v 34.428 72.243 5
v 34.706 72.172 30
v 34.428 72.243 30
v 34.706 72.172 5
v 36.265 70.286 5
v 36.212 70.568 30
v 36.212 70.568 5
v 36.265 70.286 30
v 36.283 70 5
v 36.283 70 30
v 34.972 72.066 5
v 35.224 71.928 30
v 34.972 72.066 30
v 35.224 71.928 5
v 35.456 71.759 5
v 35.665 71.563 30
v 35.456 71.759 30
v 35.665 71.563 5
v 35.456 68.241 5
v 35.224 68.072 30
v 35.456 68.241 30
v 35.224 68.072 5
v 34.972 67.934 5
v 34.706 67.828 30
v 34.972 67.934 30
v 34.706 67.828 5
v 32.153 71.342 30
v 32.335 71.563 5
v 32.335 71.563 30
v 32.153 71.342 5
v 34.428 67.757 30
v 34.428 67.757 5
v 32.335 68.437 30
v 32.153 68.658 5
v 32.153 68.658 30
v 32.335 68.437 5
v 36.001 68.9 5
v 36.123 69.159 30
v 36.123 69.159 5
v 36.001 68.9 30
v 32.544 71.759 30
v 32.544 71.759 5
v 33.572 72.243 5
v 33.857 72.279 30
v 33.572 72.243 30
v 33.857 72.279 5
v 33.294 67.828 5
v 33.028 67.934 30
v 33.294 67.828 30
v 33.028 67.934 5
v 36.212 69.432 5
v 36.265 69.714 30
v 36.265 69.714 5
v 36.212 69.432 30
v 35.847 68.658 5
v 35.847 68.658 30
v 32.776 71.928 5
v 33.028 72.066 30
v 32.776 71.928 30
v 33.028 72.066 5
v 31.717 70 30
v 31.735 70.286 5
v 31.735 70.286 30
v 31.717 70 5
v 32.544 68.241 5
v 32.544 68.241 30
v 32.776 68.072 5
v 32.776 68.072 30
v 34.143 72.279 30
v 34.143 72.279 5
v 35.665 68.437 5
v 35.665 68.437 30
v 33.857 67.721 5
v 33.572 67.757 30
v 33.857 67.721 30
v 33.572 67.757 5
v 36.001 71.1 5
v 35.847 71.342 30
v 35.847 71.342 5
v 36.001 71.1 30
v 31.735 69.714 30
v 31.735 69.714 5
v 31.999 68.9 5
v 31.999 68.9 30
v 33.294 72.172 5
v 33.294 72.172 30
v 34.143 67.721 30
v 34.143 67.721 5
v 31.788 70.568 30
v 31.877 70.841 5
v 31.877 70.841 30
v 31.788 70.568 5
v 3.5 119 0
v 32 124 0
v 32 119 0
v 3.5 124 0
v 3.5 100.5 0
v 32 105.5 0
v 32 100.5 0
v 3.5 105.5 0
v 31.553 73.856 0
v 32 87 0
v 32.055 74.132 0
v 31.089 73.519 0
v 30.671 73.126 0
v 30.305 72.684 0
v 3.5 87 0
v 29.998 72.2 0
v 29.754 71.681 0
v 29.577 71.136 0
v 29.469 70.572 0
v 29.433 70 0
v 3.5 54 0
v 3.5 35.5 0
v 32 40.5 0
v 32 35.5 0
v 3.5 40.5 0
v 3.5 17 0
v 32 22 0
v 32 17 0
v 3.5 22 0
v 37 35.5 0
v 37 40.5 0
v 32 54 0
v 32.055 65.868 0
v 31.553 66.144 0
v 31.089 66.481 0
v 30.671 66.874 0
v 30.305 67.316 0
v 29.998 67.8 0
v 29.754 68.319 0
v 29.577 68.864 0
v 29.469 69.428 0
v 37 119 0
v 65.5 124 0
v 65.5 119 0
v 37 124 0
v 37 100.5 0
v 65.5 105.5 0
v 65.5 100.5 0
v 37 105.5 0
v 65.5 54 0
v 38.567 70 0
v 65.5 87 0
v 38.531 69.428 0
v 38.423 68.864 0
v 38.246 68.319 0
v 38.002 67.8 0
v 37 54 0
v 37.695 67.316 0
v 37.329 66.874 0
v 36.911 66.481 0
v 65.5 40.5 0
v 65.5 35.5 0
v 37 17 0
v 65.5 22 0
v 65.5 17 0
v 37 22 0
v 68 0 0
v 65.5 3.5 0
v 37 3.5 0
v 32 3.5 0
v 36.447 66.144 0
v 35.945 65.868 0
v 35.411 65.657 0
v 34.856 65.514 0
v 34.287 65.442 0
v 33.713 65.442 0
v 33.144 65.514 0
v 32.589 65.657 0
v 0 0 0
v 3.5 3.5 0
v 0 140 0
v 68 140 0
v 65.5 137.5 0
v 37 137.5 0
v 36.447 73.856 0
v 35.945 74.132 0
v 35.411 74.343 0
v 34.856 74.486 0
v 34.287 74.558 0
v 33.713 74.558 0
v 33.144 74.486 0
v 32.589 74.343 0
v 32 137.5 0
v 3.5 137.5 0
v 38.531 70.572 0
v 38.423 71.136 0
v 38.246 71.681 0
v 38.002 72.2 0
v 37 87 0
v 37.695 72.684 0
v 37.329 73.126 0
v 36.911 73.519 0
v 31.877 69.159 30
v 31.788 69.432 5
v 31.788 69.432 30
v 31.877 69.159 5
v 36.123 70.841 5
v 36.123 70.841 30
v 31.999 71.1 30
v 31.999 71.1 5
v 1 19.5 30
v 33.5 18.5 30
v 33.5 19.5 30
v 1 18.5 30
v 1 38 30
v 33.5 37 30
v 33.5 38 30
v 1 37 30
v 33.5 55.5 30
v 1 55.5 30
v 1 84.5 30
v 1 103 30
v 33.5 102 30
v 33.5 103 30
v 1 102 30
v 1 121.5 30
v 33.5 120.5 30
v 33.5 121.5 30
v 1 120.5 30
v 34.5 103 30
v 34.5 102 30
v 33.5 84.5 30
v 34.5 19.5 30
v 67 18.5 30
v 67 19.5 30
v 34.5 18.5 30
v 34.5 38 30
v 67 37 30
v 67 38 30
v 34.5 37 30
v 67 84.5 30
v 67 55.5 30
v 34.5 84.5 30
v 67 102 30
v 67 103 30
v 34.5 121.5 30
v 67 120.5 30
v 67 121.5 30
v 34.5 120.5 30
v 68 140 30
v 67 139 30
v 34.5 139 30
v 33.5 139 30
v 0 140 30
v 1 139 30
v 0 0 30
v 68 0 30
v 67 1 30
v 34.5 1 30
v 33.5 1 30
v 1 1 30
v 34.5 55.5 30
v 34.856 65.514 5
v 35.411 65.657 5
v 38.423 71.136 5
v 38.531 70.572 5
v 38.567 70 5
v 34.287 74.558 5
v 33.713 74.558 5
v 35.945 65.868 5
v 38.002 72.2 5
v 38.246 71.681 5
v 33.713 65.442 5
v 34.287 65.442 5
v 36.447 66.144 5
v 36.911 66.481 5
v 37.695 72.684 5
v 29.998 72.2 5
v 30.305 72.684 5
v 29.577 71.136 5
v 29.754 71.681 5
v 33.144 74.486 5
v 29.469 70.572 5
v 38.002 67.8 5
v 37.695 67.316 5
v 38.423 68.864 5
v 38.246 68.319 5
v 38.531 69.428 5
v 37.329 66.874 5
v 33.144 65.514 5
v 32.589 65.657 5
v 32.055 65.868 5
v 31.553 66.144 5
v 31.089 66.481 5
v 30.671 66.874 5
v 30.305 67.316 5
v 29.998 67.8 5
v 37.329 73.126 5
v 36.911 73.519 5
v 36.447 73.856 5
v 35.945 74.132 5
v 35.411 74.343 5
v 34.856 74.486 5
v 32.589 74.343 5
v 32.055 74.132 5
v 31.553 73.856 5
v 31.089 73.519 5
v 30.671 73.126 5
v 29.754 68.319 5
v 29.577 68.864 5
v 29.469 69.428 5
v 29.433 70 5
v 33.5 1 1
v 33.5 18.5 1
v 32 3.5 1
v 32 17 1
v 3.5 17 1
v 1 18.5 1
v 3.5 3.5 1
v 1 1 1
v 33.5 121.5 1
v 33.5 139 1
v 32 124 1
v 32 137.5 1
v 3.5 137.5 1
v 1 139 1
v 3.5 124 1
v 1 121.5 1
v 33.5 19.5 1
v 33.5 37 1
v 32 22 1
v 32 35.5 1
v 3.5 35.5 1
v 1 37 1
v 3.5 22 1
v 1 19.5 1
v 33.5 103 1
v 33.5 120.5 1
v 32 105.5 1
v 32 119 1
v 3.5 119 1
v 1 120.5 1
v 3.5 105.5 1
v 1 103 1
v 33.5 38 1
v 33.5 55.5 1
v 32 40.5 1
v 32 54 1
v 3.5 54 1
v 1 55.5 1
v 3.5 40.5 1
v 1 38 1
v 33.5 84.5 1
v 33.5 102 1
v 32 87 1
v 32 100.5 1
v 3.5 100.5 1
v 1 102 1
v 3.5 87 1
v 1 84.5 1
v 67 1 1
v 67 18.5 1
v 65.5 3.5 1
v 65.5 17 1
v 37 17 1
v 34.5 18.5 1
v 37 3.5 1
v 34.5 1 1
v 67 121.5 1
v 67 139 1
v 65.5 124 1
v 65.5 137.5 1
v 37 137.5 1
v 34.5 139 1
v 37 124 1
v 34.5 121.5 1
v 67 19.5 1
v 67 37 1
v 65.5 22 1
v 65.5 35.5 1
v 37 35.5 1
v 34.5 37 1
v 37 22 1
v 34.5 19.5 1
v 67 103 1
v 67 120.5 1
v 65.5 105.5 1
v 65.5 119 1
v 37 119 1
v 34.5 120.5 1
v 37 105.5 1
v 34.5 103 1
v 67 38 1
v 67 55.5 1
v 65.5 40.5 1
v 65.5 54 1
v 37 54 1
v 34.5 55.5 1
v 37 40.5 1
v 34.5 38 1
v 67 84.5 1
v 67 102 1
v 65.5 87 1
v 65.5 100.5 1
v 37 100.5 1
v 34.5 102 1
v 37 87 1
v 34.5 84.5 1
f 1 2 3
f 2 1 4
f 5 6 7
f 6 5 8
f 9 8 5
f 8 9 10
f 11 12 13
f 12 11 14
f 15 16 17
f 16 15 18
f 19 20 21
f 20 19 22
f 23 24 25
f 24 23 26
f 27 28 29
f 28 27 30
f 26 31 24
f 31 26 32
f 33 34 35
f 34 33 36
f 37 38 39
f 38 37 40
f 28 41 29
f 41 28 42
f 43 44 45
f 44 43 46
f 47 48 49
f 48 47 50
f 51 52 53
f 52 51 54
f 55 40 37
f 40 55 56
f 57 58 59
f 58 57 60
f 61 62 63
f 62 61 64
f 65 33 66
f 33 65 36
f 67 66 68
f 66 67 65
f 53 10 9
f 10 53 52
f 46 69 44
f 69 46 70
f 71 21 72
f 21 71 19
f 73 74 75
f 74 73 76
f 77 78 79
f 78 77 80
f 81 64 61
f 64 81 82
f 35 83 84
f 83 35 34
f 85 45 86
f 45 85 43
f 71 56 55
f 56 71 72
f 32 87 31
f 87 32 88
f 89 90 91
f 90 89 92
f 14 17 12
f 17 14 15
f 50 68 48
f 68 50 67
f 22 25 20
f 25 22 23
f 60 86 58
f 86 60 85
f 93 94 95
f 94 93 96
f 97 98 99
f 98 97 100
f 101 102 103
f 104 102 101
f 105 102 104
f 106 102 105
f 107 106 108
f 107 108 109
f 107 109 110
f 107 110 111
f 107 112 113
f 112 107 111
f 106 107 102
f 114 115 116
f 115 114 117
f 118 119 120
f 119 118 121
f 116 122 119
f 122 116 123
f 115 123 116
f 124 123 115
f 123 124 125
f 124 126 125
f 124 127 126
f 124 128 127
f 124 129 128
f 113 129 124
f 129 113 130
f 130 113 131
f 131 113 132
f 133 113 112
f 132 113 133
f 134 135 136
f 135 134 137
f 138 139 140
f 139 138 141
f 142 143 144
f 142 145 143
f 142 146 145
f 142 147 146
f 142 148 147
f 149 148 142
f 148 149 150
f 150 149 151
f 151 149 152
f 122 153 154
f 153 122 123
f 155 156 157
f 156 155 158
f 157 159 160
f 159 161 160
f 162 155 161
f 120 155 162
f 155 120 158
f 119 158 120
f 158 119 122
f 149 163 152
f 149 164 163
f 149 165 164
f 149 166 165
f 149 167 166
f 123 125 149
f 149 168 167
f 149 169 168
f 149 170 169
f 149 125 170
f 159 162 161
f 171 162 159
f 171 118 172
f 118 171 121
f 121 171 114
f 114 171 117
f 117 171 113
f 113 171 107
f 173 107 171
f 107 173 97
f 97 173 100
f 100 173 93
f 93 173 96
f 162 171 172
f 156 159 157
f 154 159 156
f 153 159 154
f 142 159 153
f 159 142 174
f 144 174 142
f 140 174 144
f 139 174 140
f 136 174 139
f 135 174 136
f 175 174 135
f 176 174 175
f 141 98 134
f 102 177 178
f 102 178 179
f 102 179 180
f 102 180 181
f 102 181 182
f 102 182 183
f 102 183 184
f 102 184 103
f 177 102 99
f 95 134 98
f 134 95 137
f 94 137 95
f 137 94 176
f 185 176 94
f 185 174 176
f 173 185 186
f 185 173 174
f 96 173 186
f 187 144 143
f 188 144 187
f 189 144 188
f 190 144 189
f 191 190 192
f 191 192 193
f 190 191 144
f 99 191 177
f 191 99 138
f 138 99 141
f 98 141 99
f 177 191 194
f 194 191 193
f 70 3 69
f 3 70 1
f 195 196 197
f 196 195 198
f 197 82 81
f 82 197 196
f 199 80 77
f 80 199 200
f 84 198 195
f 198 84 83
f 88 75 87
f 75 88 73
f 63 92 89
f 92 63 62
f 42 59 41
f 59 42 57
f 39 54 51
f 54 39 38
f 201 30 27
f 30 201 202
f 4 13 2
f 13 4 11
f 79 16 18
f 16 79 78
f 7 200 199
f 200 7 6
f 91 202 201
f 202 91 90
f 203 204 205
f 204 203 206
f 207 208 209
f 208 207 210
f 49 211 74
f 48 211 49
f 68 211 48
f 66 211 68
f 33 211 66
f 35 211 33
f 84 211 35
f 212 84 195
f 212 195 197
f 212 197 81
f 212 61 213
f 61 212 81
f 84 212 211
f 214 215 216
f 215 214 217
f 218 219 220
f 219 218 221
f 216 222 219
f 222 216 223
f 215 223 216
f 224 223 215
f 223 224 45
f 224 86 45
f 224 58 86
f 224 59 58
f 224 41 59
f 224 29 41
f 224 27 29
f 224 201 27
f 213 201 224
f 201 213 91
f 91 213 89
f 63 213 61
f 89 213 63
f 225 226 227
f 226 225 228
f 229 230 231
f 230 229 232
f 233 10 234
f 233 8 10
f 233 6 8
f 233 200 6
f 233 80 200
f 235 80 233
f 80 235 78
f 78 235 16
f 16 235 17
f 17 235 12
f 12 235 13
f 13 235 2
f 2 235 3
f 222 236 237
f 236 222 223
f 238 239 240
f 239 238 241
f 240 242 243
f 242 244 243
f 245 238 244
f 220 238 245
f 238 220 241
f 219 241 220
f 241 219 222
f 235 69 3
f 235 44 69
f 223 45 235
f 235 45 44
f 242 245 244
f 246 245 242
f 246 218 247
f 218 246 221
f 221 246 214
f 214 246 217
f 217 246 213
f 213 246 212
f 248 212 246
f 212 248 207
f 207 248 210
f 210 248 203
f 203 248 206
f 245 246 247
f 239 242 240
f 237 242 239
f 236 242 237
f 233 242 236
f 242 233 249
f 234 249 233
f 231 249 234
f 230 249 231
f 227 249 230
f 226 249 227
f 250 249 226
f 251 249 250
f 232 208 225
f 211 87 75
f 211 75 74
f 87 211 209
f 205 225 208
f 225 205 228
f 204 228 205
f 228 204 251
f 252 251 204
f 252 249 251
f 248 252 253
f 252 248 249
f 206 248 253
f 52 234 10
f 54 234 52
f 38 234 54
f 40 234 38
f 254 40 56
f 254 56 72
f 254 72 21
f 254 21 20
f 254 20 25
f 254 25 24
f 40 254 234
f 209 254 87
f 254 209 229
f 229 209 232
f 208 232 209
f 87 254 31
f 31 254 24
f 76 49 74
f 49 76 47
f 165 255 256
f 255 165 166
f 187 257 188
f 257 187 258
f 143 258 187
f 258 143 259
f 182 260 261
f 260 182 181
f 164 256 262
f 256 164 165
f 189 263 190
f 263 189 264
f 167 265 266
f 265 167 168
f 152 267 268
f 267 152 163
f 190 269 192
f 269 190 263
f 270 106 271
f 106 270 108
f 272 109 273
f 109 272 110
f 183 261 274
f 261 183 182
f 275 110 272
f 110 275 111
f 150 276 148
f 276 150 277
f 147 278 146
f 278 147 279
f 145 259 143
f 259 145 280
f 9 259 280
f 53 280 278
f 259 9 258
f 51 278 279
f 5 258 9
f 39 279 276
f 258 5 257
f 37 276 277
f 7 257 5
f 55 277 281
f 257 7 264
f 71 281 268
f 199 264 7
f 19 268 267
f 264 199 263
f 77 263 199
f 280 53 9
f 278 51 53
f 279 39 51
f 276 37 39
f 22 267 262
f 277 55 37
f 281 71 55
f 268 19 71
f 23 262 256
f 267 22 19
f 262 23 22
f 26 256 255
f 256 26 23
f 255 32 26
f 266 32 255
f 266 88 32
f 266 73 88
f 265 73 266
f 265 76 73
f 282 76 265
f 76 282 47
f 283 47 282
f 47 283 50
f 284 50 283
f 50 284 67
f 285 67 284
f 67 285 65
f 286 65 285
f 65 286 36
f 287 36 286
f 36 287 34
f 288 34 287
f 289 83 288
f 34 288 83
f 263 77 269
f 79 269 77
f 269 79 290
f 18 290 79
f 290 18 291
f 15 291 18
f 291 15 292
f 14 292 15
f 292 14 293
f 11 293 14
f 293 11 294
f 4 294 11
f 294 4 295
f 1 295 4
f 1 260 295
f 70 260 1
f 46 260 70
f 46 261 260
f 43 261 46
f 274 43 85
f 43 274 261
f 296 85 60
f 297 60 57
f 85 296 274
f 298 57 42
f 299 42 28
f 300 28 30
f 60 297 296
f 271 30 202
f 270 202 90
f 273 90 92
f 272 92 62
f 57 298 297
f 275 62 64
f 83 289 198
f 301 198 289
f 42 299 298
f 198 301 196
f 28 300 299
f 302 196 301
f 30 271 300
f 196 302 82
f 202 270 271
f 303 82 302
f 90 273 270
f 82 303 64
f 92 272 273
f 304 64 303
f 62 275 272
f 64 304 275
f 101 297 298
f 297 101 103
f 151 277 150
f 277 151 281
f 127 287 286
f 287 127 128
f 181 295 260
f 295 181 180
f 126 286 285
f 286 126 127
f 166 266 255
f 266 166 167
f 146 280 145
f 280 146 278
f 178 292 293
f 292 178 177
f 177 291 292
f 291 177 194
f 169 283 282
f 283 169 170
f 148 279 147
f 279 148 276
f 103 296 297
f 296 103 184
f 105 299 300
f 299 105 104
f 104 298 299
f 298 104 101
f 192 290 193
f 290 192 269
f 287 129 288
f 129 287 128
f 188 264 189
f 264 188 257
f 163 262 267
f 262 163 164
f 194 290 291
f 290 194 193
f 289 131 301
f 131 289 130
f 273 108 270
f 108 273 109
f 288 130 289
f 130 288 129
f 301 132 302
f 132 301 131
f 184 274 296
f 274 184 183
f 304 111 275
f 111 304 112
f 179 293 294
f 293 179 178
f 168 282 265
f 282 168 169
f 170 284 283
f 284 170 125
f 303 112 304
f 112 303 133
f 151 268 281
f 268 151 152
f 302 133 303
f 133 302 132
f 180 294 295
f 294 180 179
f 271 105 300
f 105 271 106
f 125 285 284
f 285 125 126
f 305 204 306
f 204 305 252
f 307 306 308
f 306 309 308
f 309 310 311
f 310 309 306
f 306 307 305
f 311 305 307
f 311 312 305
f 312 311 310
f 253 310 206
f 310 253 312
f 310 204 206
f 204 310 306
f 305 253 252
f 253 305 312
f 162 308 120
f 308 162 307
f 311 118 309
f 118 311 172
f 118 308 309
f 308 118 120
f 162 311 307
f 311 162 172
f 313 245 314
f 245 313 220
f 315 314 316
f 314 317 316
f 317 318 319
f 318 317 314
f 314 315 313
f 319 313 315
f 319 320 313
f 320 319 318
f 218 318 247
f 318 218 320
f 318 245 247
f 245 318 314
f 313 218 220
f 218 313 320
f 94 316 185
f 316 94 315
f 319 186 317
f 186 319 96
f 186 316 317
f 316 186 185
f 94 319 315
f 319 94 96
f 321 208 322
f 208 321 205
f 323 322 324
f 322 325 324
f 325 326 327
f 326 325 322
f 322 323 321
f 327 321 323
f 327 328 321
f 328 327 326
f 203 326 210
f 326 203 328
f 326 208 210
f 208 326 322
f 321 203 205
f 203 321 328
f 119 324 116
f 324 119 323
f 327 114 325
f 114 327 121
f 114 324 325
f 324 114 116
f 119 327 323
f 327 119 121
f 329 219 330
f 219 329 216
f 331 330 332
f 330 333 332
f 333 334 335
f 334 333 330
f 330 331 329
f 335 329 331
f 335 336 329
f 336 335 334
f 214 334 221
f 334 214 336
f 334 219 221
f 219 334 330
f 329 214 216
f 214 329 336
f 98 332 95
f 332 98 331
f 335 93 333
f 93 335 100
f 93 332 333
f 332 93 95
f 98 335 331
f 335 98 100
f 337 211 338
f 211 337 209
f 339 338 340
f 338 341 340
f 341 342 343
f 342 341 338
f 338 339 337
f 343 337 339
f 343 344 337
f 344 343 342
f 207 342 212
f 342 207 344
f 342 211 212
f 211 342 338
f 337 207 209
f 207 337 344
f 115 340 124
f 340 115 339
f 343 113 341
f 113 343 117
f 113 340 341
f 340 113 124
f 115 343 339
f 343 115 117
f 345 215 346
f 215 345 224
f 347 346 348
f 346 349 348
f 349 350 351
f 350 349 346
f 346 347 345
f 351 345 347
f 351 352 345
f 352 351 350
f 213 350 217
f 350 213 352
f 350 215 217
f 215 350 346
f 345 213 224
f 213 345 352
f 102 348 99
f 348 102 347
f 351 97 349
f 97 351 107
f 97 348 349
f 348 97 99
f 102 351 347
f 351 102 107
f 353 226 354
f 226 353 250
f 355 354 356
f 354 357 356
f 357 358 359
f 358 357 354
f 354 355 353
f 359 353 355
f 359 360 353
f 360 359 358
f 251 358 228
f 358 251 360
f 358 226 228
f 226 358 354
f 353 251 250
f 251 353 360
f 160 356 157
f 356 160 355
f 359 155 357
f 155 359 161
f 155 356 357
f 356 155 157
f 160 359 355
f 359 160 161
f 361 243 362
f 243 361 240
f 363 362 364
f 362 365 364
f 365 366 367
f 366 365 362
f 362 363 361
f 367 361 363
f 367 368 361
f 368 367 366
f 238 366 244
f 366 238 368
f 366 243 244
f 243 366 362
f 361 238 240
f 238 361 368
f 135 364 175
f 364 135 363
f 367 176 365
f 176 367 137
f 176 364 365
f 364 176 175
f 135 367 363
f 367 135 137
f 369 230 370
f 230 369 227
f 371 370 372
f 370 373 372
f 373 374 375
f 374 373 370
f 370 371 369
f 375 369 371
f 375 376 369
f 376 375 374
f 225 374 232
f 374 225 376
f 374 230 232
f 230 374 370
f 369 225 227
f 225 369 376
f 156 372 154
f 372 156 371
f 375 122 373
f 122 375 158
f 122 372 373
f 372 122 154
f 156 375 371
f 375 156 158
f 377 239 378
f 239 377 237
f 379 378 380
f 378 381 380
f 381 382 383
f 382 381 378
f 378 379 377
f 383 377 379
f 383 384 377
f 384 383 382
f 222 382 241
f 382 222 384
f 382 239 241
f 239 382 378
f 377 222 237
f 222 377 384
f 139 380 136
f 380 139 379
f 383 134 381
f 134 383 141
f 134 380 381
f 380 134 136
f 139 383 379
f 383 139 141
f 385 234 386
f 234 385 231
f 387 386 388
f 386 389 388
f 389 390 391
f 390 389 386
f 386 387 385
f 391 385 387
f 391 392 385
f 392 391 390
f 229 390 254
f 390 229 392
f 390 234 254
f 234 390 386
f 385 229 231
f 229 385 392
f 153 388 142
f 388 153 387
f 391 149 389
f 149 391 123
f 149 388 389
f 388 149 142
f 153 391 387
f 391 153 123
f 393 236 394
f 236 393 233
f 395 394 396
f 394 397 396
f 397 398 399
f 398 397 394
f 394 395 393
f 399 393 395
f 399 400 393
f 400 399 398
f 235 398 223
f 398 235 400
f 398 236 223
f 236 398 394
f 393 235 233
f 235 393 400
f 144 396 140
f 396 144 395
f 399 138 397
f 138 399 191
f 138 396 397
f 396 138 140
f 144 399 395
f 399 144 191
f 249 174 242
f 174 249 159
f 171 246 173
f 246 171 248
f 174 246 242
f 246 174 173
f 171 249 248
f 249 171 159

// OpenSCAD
// make a box for a 50mm ammo can

$fn=50;
//ammo can inside dimensions.  long side is x axis.
can_x = 281;
can_y = 142;
can_z = 173;
can_gap = 1;    // leave this gap between the box and can walls

wall=1;         // thickness of wall being printed
floor = wall;   // thickness of floor being printed

// internal maximum box
box_max_x = can_x - 2 * can_gap;
box_max_y = can_y - 2 * can_gap;
box_max_z = can_z;

module emboss_text(text="",size=10,height=.5, vbump=0) {
    linear_extrude(height)
        mirror()
            translate([0,vbump,0])
                #text(text,size,valign="bottom",halign="right");
}

module box(txt,n_x,n_y,bat_x,bat_y,box_z,hole_offset,box_x=0,box_y=box_max_y) {
    //  txt -    text to be embossed on bottom.
    //  n_x -    number of batteries in x direction.
    //  n_y -    number of batteries in y direction.
    //  bat_x -  battery dimension in x direction.
    //  bat_y -  battery dimension in y direction.
    //  box_z -  height of box.
    //  hole_offset - if not none, size of hole edges.
    //  box_x -  x dimension of box, defaults to minimal size.
    //  box_y -  y dimension of box, defaults to max y of ammo can.

    box_x = (box_x == 0) ? n_x*bat_x+(n_x+1)*wall : box_x;
    difference() {
        cube([box_x,box_y,box_z]);
        #translate([box_x,box_y,0]) rotate([0,0,180]) translate([1,1,0])
            emboss_text(text=txt,size=5 ,height=.5);
        for (rr=[0:n_x-1]) {
            for (cc=[0:n_y-1]) {
                translate([(wall+bat_x)*rr+wall,(wall+bat_y)*cc+wall,wall]) {
                    cube([bat_x,bat_y,box_z]);
                    translate([hole_offset/2,hole_offset/2,-wall])
                        #cube([bat_x-hole_offset+1,bat_y-hole_offset+1,box_z]);
                }
            }
        }
    }
}

module battery_inset(bat_x, bat_y, box_z, wall, hole_offset) {
    cube([bat_x,bat_y,box_z]);
    translate([hole_offset/2,hole_offset/2,-wall])
        cube([bat_x-hole_offset+1,bat_y-hole_offset+1,box_z]);
}

// .1160/.0254 is for #4-40 bolt
module lift_hole(box_x, box_y, box_z,d1=.1160/.0254,d2=.1160/.0127,h1=5) {
    translate([box_x/2,box_y/2,0]) {
        translate([0,0,box_z/2])
            #cylinder(h=box_z,d=d1,center=true);
        translate([0,0,h1/2])
            #cylinder(h=h1,d=d2,center=true);
    }
}

module cbox(txt,n_x,n_y,bat_x,bat_y,box_z,hole_offset,box_x=0,box_y=box_max_y) {
    //  txt -    text to be embossed on bottom.
    //  n_x -    number of batteries in x direction.
    //  n_y -    number of batteries in y direction.
    //  bat_x -  battery dimension in x direction.
    //  bat_y -  battery dimension in y direction.
    //  box_z -  height of box.
    //  hole_offset - if not none, size of hole edges.
    //  box_x -  x dimension of box, defaults to minimal size.
    //  box_y -  y dimension of box, defaults to max y of ammo can.

    box_x = (box_x == 0) ? n_x*bat_x+(n_x+1)*wall : box_x;
    difference() {
        cube([box_x,box_y,box_z]);
        lift_hole(box_x, box_y, box_z);
        //translate([box_x,box_y,0]) rotate([0,0,180]) translate([1,1,0])
        //    emboss_text(text=txt,size=5 ,height=.5);
        for (rr=[0:n_x-1]) {
            for (cc=[0:n_y/2-1]) {
                translate([(wall+bat_x)*rr+wall,(wall+bat_y)*cc*wall,wall])
                    battery_inset(bat_x, bat_y, box_z, wall, hole_offset);
                translate([(wall+bat_x)*rr+wall,box_y-(wall+bat_y)*(cc+1),wall])
                    battery_inset(bat_x, bat_y, box_z, wall, hole_offset);
            }
        }
    }
}


module cxbox(txt,n_x,n_y,bat_x,bat_y,
             box_z,hole_offset=5,box_x=0,box_y=box_max_y) {
    //  txt -    text to be embossed on bottom.
    //  n_x -    number of batteries in x direction.
    //  n_y -    number of batteries in y direction.
    //  bat_x -  battery dimension in x direction.
    //  bat_y -  battery dimension in y direction.
    //  box_z -  height of box.
    //  hole_offset - if not none, size of hole edges.
    //  box_x -  x dimension of box, defaults to minimal size.
    //  box_y -  y dimension of box, defaults to max y of ammo can.

    box_x = (box_x == 0) ? n_x*bat_x+(n_x+1)*wall : box_x;
    difference() {
        cube([box_x,box_y,box_z]);
        lift_hole(box_x, box_y, box_z);
        //translate([box_x,box_y,0]) rotate([0,0,180]) translate([1,1,0])
        //    emboss_text(text=txt,size=5 ,height=.5);
        for (rr=[0:n_x-1]) {
            for (cc=[0:n_y/2]) {
                echo(rr,cc);
                translate([(wall+bat_x)*rr+wall,(wall+bat_y)*cc*wall+wall,wall])
                    battery_inset(bat_x, bat_y, box_z, wall, hole_offset);
                translate([(wall+bat_x)*rr+wall,box_y-(wall+bat_y)*(cc+1),wall])
                    battery_inset(bat_x, bat_y, box_z, wall, hole_offset);
            }
        }
    }
}

cxbox("3s500",n_x=2,n_y=4,bat_x=32.5,bat_y=17.5,box_z=30);
//box("3s500",n_x=2,n_y=7,bat_x=32.5,bat_y=17.5,box_z=30);
//box("3s2100",n_x=3,n_y=4,bat_x=35,bat_y=31,box_z=30);
//box("2s300",n_x=2,n_y=9,bat_x=20.5,bat_y=13.5,box_z=30);
//box("3s4000",n_x=1,n_y=5,bat_x=49,bat_y=23,box_z=60);
//box("2s500",n_x=2,n_y=9,bat_x=31,bat_y=14,box_z=25);
